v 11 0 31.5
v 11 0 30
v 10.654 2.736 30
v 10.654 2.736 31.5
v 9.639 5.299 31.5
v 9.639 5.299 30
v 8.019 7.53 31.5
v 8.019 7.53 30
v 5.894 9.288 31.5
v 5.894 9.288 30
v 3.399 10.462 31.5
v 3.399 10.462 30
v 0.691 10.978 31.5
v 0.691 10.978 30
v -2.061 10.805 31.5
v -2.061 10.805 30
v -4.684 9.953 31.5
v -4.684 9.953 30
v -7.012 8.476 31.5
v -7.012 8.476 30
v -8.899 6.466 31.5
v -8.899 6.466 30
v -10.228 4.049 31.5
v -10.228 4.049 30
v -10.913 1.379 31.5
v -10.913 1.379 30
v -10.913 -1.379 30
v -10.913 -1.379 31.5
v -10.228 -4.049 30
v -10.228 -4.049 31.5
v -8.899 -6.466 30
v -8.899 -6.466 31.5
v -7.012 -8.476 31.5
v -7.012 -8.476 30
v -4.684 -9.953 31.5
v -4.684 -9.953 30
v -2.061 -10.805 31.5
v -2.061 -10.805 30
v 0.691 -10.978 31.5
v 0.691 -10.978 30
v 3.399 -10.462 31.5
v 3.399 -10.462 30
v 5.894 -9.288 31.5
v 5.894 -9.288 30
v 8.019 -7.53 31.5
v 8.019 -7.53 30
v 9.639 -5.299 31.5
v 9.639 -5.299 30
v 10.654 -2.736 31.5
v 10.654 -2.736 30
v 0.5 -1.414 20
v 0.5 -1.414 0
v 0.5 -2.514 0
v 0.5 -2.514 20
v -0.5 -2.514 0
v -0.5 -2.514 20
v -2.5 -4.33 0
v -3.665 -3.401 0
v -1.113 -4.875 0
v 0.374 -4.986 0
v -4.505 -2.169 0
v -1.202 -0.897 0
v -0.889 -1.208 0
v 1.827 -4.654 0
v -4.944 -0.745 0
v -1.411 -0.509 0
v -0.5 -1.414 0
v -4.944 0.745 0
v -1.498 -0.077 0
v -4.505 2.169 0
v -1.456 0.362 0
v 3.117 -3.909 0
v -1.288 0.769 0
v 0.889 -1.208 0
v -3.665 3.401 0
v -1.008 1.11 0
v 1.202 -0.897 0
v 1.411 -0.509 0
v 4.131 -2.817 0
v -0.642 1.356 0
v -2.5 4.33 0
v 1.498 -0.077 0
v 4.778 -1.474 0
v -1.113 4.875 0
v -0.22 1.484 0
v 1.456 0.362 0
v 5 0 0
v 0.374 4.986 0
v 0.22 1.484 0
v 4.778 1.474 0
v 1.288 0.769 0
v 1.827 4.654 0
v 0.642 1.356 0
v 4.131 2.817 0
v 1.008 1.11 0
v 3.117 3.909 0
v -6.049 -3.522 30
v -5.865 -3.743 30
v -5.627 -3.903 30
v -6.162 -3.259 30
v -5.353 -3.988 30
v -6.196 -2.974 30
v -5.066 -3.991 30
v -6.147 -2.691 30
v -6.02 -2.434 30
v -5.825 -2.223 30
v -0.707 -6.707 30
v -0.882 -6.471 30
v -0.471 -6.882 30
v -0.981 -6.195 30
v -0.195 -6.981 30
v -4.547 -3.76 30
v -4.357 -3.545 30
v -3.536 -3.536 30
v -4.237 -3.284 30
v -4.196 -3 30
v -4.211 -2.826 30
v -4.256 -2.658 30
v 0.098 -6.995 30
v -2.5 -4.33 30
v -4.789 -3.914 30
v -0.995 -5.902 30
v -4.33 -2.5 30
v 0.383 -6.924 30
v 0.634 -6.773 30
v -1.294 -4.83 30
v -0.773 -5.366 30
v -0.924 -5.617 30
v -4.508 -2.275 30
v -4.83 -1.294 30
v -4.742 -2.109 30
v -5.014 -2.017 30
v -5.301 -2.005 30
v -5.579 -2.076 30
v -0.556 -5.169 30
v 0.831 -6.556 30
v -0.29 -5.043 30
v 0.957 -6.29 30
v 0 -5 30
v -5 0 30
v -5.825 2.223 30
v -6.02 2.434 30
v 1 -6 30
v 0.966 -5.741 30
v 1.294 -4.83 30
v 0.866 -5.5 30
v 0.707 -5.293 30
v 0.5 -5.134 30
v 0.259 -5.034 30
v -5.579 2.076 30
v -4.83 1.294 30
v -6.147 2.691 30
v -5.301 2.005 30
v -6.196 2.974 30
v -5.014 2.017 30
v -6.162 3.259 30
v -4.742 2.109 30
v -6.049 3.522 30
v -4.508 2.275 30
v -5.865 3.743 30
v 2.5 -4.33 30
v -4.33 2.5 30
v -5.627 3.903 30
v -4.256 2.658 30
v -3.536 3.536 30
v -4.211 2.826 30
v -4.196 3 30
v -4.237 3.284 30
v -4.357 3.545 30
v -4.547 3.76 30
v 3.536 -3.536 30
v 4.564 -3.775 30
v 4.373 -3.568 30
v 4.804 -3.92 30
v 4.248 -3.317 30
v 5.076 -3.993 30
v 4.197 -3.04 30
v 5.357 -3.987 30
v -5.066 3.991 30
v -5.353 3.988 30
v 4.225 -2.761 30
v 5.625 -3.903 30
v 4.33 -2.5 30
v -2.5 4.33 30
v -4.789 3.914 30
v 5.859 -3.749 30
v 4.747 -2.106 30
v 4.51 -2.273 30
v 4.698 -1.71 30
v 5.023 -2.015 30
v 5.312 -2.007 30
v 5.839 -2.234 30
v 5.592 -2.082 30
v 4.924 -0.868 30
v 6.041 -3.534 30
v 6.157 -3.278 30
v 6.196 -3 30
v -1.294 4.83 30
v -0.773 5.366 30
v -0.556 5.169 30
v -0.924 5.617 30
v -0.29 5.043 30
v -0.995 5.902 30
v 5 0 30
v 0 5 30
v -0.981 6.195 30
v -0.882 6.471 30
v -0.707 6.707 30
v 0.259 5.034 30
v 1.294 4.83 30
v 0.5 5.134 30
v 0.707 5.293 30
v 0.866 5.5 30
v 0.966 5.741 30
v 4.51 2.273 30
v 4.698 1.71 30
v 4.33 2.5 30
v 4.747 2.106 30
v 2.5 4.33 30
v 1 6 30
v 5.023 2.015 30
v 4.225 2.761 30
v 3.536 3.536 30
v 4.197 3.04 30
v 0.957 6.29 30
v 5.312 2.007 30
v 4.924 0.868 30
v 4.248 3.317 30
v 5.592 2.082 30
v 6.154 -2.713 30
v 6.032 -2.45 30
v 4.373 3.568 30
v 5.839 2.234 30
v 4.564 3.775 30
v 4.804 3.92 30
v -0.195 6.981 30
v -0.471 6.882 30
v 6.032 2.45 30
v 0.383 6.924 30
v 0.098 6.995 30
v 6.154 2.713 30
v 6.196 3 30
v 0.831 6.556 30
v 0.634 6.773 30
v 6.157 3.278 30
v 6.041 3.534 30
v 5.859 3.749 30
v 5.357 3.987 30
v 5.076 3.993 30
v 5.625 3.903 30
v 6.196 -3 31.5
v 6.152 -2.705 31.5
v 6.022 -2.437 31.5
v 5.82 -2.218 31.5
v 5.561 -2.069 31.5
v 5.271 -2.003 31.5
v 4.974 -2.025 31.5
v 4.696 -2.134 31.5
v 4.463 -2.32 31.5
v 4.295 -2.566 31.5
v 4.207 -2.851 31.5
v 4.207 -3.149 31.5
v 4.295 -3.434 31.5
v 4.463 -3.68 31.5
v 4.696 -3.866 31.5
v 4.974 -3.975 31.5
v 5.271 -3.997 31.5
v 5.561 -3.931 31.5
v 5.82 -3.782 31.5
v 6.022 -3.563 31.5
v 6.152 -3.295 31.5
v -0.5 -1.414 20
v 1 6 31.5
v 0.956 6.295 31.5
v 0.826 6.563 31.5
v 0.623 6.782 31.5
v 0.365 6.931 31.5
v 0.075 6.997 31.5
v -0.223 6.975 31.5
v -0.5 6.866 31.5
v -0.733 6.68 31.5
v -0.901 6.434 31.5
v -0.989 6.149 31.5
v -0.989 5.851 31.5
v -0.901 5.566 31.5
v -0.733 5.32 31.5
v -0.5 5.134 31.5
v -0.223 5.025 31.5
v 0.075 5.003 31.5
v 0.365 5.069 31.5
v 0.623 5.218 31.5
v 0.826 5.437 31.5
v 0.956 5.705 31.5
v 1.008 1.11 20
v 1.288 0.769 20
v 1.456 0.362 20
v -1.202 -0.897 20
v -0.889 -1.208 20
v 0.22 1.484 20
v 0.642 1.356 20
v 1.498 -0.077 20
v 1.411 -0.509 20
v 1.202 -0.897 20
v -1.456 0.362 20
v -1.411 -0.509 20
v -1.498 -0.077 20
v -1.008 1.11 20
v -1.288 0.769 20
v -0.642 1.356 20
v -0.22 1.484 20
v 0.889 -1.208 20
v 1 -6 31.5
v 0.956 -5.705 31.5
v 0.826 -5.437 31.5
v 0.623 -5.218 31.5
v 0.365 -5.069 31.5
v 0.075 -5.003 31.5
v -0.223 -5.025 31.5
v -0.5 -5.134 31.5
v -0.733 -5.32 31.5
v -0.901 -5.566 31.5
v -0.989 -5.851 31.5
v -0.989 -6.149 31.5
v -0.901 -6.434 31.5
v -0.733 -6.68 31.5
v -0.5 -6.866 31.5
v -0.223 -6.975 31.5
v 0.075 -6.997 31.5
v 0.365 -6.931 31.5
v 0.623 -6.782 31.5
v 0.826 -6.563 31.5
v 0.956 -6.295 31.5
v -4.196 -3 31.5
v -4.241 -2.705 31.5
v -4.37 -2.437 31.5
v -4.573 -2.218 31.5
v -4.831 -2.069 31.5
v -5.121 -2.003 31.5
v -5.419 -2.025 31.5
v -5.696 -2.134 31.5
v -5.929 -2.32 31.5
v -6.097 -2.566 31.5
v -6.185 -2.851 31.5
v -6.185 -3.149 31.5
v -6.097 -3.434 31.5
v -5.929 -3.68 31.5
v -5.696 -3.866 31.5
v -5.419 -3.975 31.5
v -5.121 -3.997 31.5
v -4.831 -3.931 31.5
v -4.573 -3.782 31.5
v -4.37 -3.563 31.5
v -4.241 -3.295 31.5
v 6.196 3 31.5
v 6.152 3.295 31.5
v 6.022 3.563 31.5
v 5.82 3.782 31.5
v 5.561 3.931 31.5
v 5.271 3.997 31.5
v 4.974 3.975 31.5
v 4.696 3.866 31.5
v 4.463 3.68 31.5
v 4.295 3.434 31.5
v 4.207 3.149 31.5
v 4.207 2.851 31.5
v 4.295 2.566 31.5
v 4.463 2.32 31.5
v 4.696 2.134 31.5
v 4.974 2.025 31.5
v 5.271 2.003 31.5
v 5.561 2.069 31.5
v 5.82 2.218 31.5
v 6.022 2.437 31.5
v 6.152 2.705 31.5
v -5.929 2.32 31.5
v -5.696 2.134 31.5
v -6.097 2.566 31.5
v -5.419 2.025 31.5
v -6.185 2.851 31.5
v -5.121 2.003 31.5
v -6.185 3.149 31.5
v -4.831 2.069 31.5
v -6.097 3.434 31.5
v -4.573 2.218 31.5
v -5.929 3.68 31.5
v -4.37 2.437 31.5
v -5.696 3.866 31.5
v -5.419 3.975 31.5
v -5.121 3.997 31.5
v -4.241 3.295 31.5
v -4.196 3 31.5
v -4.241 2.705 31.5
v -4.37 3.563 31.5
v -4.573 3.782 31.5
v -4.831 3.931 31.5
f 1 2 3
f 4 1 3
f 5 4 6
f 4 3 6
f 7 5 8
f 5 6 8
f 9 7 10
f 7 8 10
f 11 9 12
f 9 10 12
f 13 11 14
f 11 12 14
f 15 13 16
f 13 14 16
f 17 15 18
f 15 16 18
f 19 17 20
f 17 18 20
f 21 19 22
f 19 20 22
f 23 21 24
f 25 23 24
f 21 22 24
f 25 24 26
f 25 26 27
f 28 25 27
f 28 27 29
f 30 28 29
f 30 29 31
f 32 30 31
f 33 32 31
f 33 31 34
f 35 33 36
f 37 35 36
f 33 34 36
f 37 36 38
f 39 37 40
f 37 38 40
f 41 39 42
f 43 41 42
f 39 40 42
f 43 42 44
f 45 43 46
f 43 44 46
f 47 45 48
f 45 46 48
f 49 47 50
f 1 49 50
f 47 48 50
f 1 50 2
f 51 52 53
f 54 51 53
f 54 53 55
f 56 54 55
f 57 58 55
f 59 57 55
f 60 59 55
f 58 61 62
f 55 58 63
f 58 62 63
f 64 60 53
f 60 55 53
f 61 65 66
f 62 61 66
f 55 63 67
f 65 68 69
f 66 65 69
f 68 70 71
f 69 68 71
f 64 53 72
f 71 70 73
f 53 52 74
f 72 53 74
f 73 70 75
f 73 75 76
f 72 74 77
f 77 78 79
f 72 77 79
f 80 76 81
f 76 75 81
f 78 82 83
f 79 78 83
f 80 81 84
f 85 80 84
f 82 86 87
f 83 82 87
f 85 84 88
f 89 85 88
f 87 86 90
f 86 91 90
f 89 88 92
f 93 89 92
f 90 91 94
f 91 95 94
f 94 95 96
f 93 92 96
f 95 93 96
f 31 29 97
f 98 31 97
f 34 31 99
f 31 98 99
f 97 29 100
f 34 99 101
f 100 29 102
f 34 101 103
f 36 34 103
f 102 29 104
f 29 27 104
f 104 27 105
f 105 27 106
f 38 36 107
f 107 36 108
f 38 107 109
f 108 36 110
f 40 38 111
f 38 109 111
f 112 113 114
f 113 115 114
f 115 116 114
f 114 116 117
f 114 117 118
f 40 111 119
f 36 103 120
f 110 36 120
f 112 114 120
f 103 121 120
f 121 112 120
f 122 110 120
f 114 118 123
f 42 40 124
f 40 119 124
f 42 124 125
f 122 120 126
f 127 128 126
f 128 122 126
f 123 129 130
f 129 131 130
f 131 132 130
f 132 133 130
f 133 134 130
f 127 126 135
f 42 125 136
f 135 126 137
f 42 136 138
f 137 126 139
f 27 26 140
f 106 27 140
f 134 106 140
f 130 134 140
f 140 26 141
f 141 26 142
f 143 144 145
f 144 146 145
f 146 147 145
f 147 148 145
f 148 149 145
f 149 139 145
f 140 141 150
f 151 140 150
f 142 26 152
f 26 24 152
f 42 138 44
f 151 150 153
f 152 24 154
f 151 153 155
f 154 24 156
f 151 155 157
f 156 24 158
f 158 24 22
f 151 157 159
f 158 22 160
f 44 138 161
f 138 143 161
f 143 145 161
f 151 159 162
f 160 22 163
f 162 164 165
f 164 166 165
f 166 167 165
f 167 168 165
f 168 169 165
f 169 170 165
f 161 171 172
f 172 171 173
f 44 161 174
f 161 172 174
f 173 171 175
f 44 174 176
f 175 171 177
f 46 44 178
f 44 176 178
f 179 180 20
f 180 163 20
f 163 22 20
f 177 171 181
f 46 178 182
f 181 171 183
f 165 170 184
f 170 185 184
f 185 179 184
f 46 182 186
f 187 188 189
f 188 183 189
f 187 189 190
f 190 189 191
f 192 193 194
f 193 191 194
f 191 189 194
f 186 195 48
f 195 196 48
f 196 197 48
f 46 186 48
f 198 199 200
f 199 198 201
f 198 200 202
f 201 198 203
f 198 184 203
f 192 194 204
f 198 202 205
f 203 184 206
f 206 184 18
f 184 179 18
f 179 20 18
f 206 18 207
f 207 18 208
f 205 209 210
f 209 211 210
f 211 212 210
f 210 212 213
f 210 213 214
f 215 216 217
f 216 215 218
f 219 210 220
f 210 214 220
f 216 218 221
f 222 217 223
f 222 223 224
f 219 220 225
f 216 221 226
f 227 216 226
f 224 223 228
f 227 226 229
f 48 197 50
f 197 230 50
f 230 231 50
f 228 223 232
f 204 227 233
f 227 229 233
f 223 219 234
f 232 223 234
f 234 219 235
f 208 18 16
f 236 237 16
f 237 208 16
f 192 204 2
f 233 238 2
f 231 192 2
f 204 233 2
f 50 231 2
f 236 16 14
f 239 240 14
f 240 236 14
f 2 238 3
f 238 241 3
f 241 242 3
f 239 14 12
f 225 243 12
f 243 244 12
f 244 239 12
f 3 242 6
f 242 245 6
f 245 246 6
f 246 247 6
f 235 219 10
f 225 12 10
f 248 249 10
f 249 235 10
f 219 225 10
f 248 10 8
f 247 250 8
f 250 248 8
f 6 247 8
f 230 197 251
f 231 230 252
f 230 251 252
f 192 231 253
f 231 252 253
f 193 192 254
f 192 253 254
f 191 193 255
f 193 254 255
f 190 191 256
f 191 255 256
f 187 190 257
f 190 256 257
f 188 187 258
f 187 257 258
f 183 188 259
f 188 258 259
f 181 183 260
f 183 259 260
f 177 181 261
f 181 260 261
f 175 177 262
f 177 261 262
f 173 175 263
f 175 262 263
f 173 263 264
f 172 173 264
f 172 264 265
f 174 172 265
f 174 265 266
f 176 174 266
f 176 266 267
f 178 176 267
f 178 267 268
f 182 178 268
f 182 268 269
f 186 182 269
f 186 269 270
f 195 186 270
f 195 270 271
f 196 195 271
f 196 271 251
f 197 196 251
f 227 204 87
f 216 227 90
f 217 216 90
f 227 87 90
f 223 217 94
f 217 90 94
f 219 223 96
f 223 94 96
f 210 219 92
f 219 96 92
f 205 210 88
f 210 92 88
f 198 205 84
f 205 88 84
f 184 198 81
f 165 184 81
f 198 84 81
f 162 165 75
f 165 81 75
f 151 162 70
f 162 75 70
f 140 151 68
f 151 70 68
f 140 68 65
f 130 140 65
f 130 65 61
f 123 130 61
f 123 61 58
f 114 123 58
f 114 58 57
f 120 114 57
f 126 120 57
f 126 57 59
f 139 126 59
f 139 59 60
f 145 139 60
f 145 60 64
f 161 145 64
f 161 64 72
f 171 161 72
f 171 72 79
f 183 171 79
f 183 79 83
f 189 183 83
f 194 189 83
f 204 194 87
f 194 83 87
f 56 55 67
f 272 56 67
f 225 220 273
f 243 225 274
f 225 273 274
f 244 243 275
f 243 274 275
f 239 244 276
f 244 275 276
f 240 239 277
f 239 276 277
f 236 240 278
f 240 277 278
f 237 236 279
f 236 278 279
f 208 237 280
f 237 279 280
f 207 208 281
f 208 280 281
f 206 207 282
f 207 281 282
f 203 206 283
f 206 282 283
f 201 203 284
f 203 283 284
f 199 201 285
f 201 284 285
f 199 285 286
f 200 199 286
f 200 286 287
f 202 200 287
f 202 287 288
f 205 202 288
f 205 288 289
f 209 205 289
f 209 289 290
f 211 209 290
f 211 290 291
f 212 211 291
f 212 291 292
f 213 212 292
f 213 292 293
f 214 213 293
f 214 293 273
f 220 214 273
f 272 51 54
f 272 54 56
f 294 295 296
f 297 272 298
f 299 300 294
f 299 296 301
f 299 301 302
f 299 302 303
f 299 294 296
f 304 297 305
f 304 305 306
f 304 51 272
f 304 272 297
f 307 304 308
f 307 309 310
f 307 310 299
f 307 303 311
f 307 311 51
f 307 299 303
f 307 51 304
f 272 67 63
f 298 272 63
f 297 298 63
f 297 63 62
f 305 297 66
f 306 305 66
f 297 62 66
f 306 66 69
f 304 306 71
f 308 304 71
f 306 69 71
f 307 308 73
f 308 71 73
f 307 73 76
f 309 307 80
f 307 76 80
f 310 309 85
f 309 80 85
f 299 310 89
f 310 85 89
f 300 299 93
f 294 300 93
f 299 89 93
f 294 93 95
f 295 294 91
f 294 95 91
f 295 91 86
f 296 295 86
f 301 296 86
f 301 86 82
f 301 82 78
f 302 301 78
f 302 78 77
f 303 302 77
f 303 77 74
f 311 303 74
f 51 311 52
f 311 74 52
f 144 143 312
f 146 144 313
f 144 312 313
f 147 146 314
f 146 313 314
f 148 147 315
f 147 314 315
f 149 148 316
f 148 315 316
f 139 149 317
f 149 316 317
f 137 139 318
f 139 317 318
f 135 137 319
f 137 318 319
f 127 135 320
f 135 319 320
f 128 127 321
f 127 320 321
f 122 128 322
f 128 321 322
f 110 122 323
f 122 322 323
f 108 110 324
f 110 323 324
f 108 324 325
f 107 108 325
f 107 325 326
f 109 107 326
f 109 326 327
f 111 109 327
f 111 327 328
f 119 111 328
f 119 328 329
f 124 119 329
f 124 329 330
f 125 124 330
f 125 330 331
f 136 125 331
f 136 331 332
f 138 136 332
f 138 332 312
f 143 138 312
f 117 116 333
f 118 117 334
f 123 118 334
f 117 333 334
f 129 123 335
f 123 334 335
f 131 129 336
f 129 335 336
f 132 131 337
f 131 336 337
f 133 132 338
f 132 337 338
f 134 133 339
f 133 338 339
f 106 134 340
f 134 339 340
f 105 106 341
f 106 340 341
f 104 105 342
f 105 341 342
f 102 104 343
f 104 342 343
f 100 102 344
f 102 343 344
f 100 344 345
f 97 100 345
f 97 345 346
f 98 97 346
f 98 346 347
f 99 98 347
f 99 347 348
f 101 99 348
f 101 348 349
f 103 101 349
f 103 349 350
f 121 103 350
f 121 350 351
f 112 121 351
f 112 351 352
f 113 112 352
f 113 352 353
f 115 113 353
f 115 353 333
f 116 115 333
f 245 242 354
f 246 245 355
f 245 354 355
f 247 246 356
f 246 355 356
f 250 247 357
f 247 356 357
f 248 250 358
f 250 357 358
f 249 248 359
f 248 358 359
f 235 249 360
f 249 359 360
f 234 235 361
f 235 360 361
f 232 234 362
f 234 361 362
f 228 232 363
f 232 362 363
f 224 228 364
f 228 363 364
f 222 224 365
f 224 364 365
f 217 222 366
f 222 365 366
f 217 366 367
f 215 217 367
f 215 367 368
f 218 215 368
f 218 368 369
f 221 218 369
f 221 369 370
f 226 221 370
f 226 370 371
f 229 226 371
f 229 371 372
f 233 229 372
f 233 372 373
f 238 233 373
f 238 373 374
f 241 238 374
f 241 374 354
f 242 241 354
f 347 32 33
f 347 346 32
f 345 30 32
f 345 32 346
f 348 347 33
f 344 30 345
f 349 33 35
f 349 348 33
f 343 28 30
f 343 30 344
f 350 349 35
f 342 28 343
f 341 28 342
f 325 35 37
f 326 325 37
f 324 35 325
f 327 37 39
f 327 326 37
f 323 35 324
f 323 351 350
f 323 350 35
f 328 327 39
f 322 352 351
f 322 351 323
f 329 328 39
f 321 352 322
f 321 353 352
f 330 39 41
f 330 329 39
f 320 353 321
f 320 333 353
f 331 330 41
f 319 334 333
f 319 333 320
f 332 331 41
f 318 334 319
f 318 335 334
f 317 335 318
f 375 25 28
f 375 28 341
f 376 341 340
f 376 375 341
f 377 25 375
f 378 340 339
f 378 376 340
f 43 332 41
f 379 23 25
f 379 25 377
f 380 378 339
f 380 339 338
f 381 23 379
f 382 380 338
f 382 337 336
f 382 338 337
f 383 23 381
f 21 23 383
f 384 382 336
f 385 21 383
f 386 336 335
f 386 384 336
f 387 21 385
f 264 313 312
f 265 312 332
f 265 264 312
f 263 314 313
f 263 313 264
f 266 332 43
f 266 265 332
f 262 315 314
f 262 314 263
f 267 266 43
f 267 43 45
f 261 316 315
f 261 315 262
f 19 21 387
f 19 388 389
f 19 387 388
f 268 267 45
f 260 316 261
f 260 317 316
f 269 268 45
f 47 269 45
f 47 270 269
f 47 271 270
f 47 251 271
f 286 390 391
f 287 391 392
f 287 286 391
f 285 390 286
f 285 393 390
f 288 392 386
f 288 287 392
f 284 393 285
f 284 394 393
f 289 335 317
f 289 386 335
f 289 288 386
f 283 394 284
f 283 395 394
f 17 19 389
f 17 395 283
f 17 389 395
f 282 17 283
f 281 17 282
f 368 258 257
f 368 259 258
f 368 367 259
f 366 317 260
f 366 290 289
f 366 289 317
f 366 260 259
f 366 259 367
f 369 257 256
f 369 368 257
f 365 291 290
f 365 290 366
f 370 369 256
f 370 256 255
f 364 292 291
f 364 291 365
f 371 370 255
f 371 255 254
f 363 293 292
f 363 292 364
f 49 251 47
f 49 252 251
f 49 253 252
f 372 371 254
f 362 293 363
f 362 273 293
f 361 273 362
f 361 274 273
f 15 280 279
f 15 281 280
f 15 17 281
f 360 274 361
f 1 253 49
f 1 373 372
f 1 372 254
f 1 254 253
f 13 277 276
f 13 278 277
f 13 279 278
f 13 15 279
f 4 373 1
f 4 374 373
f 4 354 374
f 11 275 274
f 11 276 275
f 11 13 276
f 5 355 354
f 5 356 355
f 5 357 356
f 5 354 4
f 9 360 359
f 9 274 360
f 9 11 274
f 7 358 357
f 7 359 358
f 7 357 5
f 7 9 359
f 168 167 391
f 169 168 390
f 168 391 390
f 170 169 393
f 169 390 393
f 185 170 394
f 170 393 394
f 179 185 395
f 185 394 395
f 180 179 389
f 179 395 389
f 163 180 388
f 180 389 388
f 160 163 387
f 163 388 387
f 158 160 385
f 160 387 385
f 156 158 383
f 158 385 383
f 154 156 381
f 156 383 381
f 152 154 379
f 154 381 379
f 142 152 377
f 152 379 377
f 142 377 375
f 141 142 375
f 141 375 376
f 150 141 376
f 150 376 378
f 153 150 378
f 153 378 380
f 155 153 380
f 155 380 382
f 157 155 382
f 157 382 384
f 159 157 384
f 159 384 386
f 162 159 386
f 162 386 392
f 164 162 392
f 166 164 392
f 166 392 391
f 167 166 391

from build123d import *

# Parameters (mm, degrees)
SKETCH1_R           = 5
BOSS_EXTRUDE1_DEPTH = 30
CUT_EXTRUDE1_DEPTH  = 20
SKETCH3_R           = 11
BOSS_EXTRUDE2_DEPTH = 1.5
SKETCH4_R           = 1
CUT_EXTRUDE2_DEPTH  = 1.5


with BuildPart() as part:
    # Sketch1 → Boss-Extrude1 (new body)
    with BuildSketch(Plane.XY):
        Circle(SKETCH1_R)
    extrude(amount=BOSS_EXTRUDE1_DEPTH)

    # Sketch2 → Cut-Extrude1 (cut)
    with BuildSketch(Plane(origin=(0, 0, 0), x_dir=(-1, 0, 0), z_dir=(0, 0, -1))):
        with BuildLine():
            Line((-0.5, -1.414213562), (-0.5, -2.514037514))
            Line((-0.5, -2.514037514), (0.5, -2.514037514))
            Line((0.5, -2.514037514), (0.5, -1.414213562))
            ThreePointArc((0.5, -1.414213562), (0, 1.5), (-0.5, -1.414213562))
        make_face()
    extrude(amount=-CUT_EXTRUDE1_DEPTH, mode=Mode.SUBTRACT)

    # Sketch3 → Boss-Extrude2 (add)
    with BuildSketch(Plane.XY.offset(30)):
        Circle(SKETCH3_R)
    extrude(amount=BOSS_EXTRUDE2_DEPTH)

    # Sketch4 → Cut-Extrude2 (cut)
    with BuildSketch(Plane.XY.offset(31.5)):
        with Locations((0, 6)):
            Circle(SKETCH4_R)
        with Locations((5.196152423, 3)):
            Circle(SKETCH4_R)
        with Locations((5.196152423, -3)):
            Circle(SKETCH4_R)
        with Locations((0, -6)):
            Circle(SKETCH4_R)
        with Locations((-5.196152423, -3)):
            Circle(SKETCH4_R)
        with Locations((-5.196152423, 3)):
            Circle(SKETCH4_R)
    extrude(amount=-CUT_EXTRUDE2_DEPTH, mode=Mode.SUBTRACT)


solid = part.part
